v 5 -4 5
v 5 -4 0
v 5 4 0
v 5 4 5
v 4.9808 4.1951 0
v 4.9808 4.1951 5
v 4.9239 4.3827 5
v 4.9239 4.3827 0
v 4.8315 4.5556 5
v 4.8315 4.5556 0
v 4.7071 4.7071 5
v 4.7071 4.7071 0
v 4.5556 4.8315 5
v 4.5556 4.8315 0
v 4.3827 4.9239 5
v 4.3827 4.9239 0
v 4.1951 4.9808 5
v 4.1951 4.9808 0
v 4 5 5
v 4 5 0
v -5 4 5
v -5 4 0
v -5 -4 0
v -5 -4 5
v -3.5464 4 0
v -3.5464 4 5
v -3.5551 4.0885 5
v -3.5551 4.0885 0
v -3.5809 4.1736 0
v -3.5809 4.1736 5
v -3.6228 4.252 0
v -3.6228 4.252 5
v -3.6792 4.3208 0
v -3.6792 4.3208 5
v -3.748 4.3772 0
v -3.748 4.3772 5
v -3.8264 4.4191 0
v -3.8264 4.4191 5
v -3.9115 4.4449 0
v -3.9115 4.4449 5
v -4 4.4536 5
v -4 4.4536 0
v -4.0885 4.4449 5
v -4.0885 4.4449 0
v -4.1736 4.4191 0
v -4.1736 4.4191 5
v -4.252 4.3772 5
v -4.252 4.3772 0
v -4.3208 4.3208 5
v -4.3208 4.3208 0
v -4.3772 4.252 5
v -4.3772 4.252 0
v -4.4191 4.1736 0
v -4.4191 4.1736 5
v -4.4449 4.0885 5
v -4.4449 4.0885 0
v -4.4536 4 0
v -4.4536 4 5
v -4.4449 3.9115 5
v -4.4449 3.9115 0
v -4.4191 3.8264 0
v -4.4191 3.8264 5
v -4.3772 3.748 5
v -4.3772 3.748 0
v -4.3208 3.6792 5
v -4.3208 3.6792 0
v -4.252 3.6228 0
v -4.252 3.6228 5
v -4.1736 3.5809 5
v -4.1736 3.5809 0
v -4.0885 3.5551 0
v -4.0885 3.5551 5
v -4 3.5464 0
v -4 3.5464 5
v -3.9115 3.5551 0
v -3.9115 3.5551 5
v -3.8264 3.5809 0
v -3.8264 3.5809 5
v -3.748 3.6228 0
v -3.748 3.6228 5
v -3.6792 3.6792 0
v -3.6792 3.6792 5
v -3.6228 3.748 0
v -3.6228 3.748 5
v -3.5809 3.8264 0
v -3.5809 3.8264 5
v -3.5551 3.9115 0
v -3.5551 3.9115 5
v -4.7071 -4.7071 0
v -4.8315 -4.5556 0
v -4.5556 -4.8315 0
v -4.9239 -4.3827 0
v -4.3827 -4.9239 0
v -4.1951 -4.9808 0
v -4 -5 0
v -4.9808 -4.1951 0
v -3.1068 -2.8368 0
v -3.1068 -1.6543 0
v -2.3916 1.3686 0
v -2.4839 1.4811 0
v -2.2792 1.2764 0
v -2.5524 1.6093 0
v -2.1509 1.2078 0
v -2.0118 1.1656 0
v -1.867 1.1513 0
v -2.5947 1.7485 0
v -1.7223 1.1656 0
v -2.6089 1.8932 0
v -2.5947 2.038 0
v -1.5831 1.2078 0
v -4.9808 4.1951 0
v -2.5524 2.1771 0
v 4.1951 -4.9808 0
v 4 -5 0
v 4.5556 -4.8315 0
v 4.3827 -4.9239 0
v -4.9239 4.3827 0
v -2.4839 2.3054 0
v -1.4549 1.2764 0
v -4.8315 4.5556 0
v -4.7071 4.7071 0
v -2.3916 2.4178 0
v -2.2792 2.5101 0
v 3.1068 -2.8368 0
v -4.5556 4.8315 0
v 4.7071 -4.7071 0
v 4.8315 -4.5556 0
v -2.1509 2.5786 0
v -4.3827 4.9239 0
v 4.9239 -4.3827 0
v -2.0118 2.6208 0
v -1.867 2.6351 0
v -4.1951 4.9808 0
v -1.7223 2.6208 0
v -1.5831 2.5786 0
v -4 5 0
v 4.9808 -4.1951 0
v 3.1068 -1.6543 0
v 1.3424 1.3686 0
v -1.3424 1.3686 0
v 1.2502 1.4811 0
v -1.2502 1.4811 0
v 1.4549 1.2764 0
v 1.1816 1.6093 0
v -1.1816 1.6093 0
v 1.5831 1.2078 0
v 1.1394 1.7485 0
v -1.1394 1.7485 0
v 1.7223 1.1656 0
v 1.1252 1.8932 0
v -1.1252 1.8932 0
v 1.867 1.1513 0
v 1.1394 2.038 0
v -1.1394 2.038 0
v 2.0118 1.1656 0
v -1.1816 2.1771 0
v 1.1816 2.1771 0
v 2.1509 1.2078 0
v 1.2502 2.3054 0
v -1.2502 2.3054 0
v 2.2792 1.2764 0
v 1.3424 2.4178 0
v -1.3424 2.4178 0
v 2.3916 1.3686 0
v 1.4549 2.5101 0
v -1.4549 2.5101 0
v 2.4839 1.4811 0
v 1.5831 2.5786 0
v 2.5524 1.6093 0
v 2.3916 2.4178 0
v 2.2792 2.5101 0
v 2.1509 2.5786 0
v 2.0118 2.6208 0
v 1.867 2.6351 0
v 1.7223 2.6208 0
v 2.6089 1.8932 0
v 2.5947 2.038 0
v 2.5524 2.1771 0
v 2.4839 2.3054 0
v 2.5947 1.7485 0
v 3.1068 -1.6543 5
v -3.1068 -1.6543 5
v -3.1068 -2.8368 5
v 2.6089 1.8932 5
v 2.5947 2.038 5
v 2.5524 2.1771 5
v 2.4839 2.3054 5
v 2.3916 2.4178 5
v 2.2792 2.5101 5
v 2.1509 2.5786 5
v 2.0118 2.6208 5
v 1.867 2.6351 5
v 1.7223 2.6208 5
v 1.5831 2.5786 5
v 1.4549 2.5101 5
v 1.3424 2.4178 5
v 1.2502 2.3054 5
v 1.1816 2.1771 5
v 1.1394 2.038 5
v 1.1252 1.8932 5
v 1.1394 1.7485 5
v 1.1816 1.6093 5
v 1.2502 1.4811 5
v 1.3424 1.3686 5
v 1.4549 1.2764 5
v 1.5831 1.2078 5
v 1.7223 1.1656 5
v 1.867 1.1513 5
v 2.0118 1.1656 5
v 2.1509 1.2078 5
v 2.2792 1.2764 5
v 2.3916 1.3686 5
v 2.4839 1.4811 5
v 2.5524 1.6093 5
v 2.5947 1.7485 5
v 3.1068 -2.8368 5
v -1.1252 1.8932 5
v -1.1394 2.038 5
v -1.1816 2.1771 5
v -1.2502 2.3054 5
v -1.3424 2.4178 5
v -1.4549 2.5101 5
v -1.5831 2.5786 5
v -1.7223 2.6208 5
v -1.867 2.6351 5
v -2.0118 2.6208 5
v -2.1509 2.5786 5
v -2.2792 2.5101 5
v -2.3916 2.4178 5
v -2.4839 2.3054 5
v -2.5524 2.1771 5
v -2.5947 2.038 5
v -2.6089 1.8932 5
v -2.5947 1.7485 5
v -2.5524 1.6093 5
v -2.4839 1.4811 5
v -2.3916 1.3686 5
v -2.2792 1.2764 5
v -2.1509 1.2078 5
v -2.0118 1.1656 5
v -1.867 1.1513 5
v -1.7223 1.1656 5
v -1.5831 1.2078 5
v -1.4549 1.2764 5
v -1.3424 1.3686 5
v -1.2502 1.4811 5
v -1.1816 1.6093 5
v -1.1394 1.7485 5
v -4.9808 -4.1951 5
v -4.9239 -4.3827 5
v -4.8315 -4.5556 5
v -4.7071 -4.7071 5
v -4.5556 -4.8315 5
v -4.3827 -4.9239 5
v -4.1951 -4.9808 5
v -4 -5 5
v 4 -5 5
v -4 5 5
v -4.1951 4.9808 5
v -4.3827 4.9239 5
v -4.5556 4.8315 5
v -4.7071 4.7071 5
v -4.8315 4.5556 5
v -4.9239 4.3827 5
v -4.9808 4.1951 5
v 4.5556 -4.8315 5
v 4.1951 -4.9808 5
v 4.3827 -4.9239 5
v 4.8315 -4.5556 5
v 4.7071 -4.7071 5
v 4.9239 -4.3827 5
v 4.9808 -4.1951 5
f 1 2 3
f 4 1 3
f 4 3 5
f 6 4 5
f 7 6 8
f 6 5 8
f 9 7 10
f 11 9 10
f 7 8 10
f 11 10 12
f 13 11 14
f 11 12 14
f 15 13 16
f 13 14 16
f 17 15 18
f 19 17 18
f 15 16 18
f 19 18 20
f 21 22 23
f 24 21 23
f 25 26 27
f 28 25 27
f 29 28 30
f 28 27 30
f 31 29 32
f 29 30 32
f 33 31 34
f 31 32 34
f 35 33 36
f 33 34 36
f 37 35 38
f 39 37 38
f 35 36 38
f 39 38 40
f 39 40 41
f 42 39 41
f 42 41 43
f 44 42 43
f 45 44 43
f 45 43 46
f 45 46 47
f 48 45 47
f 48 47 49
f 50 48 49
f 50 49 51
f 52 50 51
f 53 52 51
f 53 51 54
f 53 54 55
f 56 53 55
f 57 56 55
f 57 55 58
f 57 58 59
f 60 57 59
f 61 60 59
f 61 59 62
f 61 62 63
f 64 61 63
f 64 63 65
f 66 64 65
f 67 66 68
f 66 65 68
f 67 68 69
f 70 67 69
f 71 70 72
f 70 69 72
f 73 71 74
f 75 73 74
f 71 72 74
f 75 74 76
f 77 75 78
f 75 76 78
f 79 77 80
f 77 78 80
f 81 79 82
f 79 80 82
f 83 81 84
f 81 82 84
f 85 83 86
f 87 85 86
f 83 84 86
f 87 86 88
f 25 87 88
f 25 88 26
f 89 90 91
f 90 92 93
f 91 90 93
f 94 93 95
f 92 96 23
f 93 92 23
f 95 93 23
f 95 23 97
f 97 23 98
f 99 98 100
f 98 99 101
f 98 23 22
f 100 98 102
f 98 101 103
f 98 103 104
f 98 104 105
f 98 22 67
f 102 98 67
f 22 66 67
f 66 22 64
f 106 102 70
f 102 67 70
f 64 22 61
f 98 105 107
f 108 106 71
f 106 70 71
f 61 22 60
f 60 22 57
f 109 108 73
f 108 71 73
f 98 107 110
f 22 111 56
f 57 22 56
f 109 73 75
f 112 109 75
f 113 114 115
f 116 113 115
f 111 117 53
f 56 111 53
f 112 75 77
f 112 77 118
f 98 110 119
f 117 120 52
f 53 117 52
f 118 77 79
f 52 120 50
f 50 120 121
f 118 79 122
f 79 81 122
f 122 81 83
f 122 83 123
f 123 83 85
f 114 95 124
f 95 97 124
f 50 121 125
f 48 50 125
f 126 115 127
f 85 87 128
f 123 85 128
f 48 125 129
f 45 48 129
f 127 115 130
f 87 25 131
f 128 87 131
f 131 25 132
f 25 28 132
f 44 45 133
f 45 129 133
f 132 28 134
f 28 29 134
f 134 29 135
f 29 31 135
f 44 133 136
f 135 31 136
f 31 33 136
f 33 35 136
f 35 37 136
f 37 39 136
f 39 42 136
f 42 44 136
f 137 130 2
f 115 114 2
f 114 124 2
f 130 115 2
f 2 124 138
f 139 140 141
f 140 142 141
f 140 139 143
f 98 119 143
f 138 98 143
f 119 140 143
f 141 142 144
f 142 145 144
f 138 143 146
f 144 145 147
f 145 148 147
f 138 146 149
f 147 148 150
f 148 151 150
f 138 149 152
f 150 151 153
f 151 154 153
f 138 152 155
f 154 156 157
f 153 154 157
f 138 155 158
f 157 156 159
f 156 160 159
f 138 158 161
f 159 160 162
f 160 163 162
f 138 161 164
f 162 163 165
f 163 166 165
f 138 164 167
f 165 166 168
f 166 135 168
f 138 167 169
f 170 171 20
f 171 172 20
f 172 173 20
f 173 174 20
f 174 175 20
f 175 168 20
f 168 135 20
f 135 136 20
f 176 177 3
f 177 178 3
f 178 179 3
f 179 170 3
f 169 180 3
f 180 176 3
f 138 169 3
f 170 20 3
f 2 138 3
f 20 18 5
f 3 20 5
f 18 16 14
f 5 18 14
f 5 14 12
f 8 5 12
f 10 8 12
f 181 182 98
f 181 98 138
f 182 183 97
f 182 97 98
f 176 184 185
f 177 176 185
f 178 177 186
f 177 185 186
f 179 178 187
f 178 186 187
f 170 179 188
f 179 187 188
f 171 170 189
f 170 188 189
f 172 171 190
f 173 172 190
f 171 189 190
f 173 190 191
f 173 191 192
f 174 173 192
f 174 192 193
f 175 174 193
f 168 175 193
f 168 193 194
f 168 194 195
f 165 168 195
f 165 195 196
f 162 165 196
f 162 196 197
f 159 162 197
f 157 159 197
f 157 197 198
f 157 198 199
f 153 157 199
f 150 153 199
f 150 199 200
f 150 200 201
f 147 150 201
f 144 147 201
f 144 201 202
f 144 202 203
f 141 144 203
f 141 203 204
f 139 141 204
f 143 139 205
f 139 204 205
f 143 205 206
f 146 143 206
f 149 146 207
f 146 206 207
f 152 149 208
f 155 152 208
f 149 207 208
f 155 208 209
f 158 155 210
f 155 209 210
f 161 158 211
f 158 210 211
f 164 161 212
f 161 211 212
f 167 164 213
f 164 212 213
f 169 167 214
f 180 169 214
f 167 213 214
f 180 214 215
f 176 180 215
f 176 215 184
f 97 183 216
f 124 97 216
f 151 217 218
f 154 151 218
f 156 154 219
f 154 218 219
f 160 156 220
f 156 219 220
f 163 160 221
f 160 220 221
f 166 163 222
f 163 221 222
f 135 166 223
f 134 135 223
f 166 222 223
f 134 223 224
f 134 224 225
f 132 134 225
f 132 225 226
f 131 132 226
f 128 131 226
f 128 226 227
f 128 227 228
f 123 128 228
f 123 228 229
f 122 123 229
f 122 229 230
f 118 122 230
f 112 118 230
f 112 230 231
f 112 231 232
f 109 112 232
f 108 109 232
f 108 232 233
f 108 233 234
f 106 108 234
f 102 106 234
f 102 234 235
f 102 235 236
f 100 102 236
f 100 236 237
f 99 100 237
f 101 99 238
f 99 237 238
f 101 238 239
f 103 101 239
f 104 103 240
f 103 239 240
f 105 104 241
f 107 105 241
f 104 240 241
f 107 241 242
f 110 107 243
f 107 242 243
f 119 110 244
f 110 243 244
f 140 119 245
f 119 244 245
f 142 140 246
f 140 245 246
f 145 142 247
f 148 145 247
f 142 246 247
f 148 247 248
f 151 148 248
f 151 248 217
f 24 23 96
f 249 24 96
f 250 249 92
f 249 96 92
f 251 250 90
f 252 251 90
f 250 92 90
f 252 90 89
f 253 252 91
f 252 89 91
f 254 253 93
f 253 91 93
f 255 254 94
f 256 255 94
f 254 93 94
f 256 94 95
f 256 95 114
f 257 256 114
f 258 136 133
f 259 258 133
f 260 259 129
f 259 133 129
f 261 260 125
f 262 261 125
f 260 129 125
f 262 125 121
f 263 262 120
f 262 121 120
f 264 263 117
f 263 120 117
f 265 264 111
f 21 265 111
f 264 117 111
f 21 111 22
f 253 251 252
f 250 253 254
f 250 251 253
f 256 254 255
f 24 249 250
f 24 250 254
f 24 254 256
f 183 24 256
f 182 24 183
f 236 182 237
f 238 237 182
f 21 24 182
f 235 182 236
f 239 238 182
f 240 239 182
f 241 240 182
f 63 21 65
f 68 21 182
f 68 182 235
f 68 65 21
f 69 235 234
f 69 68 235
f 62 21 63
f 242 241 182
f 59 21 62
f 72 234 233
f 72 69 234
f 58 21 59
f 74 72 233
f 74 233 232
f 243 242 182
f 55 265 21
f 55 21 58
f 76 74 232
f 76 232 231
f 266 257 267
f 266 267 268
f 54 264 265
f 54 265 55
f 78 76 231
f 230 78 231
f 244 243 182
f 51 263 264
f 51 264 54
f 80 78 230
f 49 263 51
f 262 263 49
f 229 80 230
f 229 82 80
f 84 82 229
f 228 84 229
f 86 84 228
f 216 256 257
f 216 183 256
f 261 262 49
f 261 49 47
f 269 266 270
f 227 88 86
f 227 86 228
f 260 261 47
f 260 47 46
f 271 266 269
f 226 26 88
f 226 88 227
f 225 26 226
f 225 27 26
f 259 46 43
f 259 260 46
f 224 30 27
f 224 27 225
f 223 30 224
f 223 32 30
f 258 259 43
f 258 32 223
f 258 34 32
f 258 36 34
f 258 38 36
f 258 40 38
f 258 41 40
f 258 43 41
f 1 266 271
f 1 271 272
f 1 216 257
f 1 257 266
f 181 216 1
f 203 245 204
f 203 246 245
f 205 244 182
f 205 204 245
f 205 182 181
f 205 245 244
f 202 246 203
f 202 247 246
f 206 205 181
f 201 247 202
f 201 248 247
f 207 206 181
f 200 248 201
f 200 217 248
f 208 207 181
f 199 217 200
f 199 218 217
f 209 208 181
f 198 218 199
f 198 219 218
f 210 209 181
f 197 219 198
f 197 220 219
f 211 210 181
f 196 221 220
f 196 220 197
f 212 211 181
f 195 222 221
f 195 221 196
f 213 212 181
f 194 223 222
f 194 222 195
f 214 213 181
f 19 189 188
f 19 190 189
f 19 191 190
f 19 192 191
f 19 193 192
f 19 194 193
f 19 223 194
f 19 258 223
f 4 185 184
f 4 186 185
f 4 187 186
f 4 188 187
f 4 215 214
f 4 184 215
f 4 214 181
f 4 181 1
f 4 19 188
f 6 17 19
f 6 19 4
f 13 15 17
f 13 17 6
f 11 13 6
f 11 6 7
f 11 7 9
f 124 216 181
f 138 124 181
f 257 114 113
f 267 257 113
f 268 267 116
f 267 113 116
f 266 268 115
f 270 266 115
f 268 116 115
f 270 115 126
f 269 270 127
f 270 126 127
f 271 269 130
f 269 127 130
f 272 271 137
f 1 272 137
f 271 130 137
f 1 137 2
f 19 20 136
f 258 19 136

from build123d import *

# Parameters (mm, degrees)
F1_DEPTH = 5
F2_R     = 0.741879
F2_W     = 6.213516
F2_H     = 1.182511
F3_DEPTH = 25
F4_R     = 0.453629
F5_DEPTH = 5.001


with BuildPart() as f1:
    # F0 (on Top) → F1 (new body)
    with BuildSketch(Plane.XY):
        with BuildLine():
            Line((4, 5), (-4, 5))
            ThreePointArc((-4, 5), (-4.707107, 4.707107), (-5, 4))
            Line((-5, 4), (-5, -4))
            ThreePointArc((-5, -4), (-4.707107, -4.707107), (-4, -5))
            Line((-4, -5), (4, -5))
            ThreePointArc((4, -5), (4.707107, -4.707107), (5, -4))
            Line((5, -4), (5, 4))
            ThreePointArc((5, 4), (4.707107, 4.707107), (4, 5))
        make_face()
    extrude(amount=F1_DEPTH)

    # F2 (on face) → F3 (cut)
    with BuildSketch(Plane.XY.offset(5)):
        with Locations((-1.867029, 1.893217)):
            Circle(F2_R)
        with Locations((1.867029, 1.893217)):
            Circle(F2_R)
        with Locations((0, -2.24557)):
            Rectangle(F2_W, F2_H)
    extrude(amount=-F3_DEPTH, mode=Mode.SUBTRACT)

    # F4 (on face) → F5 (cut, through all)
    with BuildSketch(Plane.XY.offset(5)):
        with Locations((-4, 4)):
            Circle(F4_R)
    extrude(amount=-F5_DEPTH, mode=Mode.SUBTRACT)


solid = f1.part
